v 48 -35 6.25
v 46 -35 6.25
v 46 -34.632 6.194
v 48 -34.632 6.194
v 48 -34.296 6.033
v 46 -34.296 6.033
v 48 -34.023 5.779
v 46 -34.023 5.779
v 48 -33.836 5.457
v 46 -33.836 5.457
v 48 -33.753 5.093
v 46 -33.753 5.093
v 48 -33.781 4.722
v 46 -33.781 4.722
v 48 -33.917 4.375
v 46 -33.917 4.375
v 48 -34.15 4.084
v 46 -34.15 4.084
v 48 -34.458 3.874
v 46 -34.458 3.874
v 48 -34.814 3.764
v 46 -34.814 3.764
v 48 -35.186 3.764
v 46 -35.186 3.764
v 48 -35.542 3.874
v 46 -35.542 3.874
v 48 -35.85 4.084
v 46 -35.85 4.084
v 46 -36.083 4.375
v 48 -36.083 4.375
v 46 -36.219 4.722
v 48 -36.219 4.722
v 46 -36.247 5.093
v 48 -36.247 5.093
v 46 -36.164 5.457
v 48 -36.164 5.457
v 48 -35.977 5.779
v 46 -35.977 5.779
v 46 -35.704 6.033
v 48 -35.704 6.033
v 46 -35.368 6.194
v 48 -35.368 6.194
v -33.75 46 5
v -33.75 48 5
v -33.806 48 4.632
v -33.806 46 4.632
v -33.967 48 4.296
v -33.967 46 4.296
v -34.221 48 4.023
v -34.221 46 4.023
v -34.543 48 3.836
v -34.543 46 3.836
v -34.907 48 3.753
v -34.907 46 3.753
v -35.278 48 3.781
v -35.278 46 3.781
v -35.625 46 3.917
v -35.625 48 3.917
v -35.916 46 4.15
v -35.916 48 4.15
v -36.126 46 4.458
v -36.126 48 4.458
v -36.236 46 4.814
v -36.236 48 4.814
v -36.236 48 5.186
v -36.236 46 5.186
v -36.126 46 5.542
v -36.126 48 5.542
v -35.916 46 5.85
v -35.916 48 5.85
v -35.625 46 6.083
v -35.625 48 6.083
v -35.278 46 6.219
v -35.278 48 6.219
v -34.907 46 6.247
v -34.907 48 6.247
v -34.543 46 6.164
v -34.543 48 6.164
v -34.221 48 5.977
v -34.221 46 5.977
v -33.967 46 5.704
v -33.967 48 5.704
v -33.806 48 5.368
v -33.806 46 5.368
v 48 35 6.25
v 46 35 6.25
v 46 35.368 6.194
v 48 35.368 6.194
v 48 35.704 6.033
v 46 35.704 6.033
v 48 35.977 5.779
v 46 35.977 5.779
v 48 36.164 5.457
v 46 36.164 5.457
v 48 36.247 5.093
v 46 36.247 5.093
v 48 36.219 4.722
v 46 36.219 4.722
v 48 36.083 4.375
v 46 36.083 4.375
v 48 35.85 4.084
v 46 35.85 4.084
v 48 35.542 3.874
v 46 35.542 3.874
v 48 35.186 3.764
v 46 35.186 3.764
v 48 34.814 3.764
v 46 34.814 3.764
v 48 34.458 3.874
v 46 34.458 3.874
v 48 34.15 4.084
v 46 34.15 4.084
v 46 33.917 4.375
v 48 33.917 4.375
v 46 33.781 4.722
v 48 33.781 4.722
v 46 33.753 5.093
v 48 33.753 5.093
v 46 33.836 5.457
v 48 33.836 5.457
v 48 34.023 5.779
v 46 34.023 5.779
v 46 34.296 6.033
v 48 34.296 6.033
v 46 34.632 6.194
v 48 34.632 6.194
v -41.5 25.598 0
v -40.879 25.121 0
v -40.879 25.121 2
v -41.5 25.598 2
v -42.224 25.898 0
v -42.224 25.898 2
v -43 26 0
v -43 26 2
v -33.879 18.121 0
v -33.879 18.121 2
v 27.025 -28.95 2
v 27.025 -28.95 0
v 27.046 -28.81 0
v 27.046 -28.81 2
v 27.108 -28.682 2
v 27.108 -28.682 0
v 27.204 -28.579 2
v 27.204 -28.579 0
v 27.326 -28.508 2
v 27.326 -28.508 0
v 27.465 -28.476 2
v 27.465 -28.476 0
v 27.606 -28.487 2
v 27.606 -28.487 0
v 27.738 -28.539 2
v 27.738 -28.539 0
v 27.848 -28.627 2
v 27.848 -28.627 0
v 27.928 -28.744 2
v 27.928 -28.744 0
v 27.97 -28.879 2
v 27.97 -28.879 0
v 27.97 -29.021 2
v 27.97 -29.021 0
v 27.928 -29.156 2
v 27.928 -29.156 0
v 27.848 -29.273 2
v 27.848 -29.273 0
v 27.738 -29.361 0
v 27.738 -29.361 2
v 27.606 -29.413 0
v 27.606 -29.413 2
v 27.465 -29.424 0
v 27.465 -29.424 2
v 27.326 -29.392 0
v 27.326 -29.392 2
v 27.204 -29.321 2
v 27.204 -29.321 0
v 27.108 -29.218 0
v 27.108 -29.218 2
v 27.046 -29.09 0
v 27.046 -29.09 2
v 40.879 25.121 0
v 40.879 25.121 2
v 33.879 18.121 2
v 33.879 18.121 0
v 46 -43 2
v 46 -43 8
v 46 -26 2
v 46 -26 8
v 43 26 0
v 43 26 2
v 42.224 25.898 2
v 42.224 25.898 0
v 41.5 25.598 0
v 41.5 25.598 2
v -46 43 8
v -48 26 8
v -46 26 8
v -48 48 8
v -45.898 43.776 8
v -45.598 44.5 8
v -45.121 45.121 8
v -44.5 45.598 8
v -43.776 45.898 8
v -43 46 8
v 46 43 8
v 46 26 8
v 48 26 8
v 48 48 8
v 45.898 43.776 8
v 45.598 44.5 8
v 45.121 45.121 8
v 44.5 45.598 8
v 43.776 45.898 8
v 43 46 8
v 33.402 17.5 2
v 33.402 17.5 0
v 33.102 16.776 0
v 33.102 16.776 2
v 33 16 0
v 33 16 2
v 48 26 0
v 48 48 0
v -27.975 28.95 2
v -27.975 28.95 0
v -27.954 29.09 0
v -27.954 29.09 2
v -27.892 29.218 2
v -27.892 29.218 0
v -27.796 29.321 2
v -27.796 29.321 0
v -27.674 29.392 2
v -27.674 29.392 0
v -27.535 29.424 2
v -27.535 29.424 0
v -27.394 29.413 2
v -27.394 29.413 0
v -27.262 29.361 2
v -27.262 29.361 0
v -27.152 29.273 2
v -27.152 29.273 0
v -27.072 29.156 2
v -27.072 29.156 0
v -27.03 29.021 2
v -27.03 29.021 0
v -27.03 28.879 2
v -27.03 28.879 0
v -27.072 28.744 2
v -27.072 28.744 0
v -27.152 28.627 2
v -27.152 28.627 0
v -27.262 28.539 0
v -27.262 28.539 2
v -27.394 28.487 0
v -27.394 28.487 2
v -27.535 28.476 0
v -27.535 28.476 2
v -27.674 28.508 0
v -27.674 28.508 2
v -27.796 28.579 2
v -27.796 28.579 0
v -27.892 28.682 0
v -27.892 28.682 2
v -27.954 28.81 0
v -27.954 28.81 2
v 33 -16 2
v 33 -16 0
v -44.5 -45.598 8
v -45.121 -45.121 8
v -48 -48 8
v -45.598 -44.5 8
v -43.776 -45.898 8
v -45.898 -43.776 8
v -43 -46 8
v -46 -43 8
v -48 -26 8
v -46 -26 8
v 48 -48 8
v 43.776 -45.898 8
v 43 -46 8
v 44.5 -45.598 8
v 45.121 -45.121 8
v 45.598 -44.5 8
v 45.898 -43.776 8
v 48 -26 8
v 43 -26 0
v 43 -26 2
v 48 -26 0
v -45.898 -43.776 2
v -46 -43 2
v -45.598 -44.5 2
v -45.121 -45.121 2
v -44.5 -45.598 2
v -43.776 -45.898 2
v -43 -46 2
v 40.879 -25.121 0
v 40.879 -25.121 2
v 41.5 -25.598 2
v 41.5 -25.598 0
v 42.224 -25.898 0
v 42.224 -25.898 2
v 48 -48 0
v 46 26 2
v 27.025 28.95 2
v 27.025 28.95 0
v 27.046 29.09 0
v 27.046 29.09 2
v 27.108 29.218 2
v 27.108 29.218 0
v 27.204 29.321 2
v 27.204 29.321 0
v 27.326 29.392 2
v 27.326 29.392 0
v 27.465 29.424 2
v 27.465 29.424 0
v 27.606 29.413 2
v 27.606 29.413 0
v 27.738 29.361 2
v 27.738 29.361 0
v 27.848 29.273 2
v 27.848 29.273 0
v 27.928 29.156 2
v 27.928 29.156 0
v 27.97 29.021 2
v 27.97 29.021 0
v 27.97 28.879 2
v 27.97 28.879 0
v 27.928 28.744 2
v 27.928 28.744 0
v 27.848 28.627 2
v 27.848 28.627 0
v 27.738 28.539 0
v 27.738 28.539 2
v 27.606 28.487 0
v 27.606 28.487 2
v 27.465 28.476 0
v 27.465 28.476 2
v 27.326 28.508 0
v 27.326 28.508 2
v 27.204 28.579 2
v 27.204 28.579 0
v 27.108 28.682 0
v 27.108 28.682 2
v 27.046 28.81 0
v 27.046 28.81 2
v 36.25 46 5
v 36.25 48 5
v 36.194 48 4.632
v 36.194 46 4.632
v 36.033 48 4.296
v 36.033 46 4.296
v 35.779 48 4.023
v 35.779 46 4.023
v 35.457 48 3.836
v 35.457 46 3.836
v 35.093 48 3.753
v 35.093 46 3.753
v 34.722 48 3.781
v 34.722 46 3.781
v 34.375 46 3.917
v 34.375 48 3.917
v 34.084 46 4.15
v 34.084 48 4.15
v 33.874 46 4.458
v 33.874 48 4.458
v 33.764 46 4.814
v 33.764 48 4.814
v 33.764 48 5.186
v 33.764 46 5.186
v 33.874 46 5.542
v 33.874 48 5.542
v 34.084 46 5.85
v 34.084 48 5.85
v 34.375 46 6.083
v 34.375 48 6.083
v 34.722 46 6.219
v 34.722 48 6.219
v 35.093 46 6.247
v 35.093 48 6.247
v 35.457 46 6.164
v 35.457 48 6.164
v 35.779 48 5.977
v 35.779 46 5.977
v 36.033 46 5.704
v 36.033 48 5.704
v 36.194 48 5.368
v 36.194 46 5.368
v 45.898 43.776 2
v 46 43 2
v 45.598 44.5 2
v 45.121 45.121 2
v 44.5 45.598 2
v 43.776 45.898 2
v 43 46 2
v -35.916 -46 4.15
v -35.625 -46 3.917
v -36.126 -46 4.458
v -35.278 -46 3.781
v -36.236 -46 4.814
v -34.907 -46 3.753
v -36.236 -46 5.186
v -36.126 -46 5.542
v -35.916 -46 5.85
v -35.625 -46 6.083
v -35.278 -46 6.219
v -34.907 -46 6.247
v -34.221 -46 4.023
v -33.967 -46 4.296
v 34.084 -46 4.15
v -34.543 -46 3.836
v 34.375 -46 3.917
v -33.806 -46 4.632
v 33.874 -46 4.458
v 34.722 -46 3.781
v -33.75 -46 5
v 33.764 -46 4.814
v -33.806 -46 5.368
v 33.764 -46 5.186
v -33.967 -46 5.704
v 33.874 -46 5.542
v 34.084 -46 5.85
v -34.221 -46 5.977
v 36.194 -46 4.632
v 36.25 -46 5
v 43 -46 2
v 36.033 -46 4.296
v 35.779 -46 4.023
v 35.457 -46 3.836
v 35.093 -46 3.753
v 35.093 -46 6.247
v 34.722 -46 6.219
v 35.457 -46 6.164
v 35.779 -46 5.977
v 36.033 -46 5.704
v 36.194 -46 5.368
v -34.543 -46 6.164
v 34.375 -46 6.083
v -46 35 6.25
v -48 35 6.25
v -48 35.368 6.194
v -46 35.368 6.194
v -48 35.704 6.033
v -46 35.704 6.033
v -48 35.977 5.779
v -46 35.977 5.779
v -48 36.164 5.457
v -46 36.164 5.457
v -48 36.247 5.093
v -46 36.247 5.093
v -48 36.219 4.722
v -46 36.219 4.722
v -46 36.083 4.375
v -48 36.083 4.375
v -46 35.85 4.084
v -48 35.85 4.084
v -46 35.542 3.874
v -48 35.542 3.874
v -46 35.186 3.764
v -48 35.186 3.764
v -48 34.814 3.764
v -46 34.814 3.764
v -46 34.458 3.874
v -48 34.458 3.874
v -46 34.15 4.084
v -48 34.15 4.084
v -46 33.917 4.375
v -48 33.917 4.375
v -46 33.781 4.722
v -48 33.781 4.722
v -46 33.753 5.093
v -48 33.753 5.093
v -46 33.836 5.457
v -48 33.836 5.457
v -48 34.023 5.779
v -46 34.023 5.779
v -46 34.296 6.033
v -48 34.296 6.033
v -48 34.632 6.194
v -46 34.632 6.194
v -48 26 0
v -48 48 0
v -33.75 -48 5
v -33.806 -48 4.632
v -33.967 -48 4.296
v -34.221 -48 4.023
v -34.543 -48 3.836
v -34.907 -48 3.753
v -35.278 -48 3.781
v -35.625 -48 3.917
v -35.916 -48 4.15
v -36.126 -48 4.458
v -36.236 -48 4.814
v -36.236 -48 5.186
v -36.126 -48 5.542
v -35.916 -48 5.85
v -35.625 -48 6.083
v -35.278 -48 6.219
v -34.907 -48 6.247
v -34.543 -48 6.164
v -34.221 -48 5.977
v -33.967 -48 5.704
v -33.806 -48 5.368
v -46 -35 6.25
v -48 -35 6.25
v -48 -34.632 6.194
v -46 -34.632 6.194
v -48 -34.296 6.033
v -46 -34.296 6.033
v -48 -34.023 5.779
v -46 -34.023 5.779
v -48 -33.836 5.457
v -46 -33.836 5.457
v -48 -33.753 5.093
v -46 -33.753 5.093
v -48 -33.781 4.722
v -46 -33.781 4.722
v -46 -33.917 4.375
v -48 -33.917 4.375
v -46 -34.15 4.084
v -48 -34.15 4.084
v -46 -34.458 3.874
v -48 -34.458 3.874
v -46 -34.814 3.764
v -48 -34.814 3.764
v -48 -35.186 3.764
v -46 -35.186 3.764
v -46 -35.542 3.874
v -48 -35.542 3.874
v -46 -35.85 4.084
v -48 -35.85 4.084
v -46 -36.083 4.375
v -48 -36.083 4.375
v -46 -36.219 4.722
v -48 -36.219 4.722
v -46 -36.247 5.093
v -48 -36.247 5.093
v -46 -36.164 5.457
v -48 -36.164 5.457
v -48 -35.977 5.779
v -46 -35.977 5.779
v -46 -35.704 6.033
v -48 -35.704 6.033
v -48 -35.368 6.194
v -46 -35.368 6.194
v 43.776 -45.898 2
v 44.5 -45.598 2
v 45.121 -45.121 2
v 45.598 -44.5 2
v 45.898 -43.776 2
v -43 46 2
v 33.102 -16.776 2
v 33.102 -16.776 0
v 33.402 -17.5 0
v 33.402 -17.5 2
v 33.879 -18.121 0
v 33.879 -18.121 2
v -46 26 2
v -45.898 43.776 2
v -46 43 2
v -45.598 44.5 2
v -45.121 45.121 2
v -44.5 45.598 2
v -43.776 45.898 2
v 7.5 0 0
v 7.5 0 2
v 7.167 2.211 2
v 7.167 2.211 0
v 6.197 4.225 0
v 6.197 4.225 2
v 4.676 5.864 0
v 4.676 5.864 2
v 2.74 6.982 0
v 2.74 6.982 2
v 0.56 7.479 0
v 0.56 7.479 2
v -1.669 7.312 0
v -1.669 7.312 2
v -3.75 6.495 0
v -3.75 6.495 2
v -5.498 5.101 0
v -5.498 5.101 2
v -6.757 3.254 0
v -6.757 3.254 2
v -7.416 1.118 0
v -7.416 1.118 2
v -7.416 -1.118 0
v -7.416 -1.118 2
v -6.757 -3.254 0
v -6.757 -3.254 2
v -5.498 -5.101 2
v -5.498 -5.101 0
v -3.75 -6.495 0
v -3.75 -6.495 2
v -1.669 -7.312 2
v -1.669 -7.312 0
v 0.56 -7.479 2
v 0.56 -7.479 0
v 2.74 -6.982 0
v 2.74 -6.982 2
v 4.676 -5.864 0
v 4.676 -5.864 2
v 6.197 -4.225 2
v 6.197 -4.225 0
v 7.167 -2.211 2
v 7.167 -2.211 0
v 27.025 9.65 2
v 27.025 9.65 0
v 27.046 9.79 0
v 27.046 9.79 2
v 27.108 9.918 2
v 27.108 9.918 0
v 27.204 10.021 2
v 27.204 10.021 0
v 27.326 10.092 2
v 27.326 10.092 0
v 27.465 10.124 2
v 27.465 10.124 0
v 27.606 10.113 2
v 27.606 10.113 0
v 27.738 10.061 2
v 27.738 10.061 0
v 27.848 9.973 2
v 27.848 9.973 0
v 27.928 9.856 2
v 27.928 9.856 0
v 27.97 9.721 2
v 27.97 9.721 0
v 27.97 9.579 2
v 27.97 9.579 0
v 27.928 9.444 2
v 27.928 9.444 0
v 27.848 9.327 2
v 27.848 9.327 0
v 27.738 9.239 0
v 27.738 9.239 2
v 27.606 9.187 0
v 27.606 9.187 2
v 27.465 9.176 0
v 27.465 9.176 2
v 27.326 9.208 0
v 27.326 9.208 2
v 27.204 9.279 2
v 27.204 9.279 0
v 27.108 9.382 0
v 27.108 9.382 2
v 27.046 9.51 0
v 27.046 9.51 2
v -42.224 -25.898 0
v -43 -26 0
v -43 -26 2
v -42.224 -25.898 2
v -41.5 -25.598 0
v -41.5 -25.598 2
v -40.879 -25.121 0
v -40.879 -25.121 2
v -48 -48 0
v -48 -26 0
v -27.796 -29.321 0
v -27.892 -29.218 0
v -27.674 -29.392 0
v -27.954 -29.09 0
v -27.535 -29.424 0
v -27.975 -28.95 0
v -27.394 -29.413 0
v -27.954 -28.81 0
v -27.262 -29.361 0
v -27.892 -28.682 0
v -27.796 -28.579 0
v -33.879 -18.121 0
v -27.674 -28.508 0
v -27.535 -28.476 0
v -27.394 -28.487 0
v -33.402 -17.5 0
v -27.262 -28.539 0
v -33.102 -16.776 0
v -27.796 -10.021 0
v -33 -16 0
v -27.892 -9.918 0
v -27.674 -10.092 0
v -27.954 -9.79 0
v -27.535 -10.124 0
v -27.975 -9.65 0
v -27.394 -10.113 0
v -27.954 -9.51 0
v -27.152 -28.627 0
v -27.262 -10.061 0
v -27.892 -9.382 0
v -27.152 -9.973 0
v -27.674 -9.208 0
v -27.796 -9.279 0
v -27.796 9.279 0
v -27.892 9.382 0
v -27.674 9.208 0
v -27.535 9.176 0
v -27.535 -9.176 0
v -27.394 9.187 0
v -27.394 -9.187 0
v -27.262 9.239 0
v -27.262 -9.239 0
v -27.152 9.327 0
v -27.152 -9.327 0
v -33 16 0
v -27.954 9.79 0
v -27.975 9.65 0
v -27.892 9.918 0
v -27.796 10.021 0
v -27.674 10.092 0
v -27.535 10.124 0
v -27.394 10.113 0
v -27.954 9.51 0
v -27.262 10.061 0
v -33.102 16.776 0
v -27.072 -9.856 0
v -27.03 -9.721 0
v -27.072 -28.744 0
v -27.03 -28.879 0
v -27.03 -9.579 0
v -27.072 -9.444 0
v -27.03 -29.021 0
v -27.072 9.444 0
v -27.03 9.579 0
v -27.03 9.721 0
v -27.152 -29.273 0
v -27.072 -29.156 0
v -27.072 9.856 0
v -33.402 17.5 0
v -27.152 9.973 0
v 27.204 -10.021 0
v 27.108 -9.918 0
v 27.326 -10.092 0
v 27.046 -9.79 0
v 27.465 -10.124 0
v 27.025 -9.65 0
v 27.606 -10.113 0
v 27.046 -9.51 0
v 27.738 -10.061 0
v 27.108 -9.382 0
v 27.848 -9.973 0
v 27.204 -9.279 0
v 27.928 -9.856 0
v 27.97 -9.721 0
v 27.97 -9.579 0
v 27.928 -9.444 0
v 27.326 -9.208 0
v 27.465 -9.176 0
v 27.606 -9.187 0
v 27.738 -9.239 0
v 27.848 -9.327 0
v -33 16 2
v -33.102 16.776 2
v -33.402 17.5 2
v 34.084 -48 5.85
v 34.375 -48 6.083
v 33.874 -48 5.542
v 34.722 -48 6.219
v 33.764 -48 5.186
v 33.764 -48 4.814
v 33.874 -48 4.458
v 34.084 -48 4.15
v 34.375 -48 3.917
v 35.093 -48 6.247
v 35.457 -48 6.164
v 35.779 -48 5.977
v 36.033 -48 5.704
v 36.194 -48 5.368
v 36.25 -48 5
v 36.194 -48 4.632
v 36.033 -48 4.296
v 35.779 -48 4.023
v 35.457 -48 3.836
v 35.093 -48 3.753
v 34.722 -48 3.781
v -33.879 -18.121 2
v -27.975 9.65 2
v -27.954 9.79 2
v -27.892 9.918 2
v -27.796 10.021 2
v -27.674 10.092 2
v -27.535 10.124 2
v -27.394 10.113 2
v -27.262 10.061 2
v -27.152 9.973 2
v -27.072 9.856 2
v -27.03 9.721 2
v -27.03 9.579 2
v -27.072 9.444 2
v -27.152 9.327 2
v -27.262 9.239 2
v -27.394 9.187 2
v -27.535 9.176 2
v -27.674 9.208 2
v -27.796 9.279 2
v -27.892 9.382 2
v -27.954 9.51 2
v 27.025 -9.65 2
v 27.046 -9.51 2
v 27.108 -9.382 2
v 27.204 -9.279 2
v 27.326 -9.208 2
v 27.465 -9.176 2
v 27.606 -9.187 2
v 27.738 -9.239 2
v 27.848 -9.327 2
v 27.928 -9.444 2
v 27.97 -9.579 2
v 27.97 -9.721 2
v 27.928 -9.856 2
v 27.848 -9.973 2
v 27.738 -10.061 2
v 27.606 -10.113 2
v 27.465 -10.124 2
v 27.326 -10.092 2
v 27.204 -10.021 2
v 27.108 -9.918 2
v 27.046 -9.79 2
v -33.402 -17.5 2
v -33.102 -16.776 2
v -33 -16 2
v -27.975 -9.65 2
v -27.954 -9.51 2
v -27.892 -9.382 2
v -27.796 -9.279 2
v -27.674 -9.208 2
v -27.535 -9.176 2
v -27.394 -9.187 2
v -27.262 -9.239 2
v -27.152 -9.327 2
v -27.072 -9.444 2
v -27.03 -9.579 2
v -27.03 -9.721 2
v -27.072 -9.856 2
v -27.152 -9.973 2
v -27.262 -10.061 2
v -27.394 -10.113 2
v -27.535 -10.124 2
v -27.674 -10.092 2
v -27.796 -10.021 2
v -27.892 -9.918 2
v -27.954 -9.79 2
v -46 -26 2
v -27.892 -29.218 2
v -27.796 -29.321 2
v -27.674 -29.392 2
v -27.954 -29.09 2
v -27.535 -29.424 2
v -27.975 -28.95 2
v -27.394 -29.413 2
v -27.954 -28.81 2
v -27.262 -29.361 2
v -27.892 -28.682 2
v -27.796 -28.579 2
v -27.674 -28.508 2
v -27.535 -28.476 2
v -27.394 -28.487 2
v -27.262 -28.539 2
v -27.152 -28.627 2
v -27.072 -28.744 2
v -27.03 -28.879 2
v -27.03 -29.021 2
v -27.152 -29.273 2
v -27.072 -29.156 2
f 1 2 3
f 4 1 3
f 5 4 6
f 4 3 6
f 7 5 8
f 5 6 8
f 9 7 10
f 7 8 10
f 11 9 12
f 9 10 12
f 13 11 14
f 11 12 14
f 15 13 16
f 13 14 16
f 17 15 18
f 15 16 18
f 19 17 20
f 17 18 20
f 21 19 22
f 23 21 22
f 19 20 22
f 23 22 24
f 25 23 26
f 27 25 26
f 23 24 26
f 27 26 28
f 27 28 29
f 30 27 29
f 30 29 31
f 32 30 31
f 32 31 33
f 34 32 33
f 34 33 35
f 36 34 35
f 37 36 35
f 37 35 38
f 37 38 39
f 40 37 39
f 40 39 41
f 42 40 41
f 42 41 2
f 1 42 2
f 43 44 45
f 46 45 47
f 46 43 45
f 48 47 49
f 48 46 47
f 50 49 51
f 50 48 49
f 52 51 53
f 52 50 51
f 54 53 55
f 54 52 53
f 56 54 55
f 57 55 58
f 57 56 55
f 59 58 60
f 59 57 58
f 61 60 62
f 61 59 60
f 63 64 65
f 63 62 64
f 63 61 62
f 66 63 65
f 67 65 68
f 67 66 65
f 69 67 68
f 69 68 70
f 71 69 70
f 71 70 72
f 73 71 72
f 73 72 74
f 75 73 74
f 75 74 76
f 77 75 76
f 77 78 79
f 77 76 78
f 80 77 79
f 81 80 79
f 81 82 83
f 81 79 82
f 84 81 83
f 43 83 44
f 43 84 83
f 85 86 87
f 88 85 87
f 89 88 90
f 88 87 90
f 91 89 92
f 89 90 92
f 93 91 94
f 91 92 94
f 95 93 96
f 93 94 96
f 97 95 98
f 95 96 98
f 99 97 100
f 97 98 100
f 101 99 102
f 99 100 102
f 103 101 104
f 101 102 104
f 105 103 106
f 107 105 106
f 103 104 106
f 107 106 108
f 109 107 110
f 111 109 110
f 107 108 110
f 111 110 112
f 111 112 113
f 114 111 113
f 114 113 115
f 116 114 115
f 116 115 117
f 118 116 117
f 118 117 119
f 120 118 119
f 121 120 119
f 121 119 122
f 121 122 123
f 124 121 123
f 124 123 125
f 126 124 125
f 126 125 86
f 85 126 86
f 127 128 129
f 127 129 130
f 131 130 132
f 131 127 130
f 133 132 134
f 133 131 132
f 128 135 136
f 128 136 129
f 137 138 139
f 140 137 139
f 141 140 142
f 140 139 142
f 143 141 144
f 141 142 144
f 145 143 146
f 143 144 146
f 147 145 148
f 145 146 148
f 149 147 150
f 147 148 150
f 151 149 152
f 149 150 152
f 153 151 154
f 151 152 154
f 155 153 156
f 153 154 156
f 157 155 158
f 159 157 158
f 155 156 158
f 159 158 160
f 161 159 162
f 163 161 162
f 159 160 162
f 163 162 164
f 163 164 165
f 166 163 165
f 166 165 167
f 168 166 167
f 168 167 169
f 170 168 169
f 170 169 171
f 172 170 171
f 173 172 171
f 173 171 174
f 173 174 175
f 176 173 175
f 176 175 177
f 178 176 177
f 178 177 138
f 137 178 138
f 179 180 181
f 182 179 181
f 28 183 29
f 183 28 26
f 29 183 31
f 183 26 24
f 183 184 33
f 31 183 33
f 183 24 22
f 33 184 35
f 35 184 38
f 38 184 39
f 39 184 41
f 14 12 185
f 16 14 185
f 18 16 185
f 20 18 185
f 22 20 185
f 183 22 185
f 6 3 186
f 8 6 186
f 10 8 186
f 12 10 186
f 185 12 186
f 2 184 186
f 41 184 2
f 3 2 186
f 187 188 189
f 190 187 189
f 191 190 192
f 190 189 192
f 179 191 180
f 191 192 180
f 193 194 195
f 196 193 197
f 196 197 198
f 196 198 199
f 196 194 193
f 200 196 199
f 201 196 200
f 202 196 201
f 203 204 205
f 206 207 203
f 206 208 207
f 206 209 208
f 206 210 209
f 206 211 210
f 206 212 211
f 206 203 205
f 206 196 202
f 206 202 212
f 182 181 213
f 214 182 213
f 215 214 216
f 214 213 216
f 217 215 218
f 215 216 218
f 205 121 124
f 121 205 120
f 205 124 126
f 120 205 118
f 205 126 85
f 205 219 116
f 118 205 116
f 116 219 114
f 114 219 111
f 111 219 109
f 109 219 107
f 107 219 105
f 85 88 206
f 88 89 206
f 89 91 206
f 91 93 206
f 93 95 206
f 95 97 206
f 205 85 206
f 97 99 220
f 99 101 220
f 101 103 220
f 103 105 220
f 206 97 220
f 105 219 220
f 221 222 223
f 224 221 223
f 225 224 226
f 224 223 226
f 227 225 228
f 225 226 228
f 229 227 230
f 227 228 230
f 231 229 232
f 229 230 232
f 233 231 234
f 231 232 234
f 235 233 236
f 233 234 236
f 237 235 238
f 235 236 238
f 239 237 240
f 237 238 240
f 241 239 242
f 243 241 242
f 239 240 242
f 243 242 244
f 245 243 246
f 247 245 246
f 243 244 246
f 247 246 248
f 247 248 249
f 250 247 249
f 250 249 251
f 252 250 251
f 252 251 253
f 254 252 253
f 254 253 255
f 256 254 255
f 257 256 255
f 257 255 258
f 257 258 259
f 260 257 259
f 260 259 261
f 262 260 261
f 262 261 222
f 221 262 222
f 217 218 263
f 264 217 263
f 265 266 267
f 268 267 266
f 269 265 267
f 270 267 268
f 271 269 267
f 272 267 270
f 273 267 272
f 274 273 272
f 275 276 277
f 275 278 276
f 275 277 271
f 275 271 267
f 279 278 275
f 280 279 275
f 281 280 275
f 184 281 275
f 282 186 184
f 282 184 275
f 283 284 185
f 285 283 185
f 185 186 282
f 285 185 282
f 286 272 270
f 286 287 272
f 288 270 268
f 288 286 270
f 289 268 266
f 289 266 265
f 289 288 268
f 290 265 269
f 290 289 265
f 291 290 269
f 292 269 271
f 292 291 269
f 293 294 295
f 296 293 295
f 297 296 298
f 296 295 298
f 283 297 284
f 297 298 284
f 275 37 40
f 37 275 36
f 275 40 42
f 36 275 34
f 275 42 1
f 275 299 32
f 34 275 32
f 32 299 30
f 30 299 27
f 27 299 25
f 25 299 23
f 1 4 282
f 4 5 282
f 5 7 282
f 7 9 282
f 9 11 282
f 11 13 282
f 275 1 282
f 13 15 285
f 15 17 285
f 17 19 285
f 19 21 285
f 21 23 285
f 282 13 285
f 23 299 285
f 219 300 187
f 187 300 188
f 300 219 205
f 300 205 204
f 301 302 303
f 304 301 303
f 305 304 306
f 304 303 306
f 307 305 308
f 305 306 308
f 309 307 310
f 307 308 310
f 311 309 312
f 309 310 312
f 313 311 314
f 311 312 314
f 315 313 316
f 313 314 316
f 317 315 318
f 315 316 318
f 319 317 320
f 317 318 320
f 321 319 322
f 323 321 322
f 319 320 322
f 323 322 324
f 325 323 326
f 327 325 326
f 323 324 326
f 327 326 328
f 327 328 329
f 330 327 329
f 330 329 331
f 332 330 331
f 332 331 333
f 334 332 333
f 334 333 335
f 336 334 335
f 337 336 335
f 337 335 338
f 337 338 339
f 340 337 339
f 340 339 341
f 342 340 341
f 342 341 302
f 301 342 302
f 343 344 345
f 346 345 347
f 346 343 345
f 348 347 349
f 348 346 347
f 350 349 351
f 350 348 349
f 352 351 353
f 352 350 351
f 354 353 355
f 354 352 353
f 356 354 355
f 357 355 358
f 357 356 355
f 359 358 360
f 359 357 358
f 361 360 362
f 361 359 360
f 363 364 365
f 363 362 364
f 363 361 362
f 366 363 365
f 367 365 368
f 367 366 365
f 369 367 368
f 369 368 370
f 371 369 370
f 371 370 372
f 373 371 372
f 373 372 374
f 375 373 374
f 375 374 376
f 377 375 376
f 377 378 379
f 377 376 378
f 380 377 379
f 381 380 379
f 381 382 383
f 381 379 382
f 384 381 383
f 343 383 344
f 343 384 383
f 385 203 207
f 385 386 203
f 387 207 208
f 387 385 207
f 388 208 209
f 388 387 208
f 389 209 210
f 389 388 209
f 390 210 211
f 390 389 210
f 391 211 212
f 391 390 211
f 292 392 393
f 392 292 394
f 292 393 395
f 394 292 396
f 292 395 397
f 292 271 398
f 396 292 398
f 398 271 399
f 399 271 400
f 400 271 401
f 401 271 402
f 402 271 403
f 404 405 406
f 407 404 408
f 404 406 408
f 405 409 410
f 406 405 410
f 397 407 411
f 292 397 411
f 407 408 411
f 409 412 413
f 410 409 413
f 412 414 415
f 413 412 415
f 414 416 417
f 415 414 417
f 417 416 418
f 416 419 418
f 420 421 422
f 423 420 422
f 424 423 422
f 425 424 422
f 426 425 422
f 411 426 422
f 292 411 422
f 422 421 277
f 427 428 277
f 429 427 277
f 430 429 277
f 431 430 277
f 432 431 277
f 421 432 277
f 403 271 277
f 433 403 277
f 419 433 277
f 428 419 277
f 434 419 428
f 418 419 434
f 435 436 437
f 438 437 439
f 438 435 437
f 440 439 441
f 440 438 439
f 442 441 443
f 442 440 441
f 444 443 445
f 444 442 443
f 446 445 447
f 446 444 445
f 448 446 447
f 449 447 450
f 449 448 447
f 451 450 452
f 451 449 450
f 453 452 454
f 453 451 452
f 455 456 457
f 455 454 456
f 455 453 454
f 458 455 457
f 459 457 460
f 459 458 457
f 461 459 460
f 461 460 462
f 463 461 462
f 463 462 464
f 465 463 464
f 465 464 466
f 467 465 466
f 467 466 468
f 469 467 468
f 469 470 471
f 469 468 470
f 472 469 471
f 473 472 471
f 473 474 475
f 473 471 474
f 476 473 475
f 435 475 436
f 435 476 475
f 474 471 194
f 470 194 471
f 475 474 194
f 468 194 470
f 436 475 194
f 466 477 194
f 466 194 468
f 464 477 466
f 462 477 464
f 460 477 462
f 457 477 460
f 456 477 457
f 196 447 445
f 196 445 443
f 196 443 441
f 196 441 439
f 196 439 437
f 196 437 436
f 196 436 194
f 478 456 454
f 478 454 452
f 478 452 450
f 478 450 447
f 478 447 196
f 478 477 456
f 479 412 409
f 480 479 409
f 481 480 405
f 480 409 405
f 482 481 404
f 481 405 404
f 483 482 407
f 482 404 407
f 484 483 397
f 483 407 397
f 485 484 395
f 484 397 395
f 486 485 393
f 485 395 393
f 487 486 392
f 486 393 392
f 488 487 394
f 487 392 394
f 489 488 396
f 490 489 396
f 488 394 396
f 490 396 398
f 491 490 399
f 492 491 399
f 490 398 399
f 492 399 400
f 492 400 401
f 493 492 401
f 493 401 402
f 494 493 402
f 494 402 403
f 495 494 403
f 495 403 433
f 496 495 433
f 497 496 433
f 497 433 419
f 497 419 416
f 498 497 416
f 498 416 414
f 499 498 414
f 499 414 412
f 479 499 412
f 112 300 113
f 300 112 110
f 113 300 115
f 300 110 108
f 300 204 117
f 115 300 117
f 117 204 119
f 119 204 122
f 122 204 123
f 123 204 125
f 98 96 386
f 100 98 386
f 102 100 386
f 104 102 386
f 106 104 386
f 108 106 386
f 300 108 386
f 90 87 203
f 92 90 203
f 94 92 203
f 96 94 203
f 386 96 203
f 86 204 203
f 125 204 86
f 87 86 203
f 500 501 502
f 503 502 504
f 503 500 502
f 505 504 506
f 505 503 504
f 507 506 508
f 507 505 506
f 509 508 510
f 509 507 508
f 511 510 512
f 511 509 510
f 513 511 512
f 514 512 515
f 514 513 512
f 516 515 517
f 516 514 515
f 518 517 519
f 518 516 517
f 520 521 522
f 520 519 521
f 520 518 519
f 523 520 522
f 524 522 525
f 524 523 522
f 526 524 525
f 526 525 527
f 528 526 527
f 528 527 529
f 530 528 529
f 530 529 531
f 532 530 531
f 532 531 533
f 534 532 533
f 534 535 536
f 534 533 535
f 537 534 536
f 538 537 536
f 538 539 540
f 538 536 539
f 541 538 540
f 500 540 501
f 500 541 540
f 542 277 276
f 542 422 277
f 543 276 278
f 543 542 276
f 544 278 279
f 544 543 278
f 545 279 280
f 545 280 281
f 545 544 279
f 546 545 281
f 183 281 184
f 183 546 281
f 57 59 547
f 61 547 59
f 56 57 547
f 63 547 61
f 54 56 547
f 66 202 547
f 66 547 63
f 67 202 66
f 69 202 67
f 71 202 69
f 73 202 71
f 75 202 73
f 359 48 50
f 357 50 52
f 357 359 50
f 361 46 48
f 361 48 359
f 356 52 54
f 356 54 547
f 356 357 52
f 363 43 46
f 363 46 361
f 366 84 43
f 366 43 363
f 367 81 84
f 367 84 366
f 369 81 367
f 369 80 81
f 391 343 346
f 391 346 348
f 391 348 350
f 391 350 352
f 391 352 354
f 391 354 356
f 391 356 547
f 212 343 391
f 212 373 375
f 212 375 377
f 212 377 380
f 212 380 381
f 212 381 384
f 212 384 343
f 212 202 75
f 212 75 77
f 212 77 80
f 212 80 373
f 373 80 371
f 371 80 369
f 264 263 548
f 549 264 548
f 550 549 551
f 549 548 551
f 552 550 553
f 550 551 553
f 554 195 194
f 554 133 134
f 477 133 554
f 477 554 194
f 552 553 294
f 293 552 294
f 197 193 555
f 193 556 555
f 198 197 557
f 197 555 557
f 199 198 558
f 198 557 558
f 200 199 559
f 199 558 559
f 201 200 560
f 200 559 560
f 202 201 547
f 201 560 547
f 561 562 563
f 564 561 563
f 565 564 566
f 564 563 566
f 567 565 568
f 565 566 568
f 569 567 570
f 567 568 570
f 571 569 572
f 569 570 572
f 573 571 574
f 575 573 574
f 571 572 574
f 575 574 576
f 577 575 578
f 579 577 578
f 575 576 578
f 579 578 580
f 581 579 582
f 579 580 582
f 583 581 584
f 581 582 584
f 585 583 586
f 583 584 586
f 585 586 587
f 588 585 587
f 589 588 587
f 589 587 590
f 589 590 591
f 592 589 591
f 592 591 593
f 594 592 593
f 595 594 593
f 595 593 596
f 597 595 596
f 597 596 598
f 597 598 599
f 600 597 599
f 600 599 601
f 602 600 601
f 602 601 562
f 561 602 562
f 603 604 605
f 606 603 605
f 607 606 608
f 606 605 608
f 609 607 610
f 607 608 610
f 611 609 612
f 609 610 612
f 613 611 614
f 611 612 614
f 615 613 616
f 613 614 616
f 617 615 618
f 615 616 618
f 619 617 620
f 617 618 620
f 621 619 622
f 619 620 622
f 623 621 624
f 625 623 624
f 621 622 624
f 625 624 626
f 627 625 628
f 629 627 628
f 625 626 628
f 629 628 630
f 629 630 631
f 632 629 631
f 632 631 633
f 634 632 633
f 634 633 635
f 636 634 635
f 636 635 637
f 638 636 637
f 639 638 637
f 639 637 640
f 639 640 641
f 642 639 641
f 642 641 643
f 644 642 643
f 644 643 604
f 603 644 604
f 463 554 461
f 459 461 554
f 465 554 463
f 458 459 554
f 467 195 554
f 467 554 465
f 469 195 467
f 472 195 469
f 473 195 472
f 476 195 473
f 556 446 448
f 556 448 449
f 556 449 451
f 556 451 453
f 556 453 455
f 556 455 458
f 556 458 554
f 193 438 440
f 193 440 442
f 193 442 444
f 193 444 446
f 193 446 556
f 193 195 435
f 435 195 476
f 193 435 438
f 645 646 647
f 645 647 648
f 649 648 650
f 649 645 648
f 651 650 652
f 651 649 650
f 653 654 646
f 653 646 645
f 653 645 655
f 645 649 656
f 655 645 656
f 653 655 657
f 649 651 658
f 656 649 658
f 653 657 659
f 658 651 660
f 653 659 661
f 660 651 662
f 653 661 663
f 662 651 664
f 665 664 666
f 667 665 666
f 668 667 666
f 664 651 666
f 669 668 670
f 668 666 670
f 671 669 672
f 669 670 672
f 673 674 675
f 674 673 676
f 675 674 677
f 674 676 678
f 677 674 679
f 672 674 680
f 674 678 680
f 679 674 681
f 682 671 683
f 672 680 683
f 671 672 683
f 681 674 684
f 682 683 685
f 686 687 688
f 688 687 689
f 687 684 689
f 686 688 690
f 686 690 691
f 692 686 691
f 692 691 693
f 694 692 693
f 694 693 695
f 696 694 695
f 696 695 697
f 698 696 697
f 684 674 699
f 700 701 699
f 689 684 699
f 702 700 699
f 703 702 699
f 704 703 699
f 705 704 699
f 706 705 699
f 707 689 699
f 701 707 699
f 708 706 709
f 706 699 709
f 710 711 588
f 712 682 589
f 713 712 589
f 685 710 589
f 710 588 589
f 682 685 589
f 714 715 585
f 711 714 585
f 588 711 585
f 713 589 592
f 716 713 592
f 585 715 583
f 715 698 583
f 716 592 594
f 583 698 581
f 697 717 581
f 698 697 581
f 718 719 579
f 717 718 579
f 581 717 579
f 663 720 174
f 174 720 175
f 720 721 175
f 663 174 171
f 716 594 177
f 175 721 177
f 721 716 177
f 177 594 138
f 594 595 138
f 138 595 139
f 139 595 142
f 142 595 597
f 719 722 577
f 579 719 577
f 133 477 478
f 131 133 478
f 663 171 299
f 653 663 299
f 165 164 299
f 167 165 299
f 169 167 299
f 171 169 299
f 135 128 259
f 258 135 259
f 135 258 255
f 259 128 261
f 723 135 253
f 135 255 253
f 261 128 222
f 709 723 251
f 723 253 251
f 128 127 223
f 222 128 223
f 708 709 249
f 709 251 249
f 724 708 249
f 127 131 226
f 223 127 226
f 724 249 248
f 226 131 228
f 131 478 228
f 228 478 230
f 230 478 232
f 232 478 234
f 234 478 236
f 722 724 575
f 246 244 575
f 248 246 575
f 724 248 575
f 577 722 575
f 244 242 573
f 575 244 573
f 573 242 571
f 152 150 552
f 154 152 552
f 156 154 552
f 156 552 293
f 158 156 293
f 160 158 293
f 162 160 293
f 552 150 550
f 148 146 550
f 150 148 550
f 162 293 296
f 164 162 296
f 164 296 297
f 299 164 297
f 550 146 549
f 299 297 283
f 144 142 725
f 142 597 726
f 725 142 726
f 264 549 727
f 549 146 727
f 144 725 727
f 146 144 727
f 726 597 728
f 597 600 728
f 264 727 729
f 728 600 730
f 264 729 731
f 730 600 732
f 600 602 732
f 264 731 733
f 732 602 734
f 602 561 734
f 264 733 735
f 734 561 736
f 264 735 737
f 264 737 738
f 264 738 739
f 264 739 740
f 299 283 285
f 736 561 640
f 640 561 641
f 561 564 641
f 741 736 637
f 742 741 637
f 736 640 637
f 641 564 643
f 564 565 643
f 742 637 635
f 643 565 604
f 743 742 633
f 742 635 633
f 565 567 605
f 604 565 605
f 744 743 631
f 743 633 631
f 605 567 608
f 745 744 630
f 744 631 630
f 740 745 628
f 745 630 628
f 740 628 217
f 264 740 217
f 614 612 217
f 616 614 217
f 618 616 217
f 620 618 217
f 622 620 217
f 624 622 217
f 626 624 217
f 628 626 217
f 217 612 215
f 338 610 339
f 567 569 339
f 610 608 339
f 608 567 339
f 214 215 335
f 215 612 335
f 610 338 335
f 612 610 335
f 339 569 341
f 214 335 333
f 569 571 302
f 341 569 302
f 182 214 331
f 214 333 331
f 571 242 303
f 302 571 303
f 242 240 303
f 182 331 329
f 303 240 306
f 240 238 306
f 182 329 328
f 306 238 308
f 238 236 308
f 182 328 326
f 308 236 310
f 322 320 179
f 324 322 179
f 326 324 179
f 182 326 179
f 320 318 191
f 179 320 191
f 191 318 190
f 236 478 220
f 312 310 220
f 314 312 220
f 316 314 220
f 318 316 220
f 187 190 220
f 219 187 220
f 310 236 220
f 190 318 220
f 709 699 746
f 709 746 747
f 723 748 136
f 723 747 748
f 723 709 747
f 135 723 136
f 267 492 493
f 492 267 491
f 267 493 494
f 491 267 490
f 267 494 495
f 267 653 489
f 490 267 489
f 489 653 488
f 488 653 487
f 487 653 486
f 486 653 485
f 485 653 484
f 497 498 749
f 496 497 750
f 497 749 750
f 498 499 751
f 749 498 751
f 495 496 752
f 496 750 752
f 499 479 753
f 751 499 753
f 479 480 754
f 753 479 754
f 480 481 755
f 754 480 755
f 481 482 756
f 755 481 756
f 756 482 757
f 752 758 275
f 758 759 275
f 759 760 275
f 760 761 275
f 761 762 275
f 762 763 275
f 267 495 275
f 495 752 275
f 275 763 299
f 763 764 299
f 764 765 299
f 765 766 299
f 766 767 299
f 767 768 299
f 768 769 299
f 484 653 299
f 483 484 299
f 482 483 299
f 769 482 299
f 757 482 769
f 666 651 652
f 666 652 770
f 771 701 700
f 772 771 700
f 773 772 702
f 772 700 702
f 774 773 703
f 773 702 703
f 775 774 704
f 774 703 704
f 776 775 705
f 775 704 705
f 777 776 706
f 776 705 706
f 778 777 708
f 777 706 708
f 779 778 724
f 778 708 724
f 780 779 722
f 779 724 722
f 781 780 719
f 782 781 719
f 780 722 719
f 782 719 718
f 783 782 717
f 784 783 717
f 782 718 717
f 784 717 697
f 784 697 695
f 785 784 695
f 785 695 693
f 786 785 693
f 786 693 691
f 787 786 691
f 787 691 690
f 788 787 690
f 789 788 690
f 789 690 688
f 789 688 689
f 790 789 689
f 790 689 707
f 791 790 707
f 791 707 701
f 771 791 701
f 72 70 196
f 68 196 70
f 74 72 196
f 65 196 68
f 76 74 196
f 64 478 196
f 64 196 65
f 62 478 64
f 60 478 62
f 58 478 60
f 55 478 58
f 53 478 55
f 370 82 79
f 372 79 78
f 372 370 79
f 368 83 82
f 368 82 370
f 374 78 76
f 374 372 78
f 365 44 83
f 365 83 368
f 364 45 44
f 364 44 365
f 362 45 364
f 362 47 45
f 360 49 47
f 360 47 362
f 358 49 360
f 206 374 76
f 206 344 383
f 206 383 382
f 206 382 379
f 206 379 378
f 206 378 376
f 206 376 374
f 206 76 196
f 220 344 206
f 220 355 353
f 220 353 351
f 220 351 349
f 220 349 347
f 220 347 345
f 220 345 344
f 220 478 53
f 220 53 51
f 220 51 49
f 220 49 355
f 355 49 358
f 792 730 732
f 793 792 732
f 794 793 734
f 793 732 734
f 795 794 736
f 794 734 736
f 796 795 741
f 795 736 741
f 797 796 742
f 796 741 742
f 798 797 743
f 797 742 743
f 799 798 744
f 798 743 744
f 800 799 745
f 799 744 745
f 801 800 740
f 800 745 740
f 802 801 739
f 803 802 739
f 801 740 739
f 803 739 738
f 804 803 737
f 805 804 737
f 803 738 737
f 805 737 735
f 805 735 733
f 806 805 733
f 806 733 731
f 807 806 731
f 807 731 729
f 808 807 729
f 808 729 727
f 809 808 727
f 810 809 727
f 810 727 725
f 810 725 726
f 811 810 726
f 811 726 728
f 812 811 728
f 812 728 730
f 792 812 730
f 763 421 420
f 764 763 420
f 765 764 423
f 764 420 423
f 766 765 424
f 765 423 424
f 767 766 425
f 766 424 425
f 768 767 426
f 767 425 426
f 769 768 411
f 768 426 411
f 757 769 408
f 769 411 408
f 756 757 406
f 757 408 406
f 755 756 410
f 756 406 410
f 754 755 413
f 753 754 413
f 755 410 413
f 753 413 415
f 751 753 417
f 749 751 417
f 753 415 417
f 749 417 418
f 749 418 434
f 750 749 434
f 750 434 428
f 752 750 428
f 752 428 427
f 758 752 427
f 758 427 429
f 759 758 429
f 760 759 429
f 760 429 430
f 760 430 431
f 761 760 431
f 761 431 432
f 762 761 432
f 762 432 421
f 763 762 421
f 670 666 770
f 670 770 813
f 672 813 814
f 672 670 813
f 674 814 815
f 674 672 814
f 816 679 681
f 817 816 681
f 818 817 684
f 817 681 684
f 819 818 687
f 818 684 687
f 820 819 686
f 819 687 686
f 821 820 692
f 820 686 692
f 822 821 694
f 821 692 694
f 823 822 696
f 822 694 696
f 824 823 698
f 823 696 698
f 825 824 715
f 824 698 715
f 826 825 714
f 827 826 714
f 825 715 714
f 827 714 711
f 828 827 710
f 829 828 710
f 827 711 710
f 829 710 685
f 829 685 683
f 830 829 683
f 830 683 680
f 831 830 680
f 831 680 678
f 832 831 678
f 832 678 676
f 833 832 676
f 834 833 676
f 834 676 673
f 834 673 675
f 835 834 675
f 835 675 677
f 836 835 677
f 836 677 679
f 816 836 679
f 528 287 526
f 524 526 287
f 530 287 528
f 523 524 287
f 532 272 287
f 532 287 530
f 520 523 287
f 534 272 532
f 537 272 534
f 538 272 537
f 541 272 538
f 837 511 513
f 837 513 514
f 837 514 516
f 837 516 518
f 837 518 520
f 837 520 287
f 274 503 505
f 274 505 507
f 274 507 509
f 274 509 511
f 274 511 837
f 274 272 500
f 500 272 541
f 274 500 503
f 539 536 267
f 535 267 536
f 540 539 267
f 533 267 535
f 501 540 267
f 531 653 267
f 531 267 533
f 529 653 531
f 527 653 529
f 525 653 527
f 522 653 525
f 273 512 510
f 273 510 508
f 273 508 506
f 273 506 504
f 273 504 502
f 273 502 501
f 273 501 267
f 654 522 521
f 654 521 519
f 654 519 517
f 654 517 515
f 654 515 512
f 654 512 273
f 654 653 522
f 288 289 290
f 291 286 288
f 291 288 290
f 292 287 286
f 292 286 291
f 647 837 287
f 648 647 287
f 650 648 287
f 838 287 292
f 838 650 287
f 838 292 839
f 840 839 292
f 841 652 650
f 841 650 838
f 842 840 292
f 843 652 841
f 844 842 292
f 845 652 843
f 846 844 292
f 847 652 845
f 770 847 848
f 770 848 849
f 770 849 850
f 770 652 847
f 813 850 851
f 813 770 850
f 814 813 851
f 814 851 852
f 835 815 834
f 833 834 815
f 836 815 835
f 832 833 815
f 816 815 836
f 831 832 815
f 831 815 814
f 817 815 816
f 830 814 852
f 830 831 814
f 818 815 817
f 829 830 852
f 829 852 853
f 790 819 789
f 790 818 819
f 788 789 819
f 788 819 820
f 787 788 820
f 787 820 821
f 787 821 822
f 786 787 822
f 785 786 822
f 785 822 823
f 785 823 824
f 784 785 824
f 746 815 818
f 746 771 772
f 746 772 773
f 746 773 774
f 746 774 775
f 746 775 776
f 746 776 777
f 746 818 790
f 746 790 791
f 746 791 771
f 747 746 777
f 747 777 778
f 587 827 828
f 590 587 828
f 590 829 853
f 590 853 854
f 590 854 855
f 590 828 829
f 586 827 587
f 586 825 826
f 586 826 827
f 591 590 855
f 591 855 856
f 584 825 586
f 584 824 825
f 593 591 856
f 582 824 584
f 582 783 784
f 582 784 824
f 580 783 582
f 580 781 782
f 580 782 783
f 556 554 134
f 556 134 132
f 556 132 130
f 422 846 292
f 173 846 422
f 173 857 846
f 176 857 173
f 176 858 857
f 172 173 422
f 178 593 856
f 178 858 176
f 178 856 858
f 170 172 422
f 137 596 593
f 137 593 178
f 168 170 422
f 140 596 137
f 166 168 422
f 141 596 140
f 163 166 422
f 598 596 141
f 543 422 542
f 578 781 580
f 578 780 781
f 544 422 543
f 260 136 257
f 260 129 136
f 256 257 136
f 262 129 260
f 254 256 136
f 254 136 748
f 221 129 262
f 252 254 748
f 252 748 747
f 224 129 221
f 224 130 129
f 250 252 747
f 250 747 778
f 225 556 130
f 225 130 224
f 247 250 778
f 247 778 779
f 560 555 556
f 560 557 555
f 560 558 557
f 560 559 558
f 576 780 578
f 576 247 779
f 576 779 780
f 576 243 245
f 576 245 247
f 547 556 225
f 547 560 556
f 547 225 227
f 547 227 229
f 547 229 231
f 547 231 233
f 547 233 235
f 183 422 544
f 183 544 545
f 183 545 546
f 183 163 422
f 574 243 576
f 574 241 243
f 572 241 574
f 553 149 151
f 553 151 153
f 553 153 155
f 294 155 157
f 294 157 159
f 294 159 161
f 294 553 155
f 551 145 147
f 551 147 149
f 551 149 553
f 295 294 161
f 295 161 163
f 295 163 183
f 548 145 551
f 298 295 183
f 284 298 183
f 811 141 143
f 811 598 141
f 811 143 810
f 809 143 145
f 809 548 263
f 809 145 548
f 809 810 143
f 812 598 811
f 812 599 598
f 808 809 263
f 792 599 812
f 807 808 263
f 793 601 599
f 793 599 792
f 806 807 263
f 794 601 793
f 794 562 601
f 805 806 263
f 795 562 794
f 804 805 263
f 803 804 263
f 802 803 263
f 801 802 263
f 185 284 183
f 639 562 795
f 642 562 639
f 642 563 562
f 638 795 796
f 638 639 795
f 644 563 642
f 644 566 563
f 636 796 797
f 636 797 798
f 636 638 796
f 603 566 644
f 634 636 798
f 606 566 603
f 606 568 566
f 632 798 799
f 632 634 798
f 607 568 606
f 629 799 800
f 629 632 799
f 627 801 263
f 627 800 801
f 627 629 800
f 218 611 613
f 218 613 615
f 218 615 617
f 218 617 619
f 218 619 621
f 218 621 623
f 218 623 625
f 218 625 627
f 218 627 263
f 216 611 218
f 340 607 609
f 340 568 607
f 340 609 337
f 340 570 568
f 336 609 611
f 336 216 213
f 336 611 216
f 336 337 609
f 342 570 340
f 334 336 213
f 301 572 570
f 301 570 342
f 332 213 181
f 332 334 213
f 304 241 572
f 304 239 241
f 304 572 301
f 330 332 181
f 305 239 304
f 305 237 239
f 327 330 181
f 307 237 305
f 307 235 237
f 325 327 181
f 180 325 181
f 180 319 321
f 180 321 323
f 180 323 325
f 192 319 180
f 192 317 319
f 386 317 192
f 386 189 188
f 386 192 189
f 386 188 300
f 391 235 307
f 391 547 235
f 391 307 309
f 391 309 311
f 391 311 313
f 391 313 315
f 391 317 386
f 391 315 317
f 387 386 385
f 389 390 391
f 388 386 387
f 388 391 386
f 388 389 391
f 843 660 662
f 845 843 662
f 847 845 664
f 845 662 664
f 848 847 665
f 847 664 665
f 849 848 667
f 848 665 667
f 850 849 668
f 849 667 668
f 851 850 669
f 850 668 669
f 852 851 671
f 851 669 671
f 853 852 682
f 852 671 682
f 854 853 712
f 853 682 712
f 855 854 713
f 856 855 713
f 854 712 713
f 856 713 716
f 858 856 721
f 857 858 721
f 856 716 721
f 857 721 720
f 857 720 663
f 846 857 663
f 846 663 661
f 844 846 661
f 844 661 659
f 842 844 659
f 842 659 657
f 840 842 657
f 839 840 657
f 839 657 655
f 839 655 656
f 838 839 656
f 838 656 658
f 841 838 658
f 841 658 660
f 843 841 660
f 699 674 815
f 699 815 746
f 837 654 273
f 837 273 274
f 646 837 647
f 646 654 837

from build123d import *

# Parameters (mm, degrees)
SKETCH1_W                       = 96
SKETCH1_H                       = 96
BOSS_EXTRUDE1_DEPTH             = 8
SKETCH2_W                       = 92
SKETCH2_H                       = 92
COMPONENT_PLATFORM_DEPTH        = 6
CABLE_SLOTS_DEPTH               = 6
SKETCH4_R                       = 7.5
CENTER_MASS_CUT_DEPTH           = 6
INNER_CORNER_FILLETS_R          = 3
TAP_DRILL_FOR_M3X0_5_TAP4_D     = 2.5
TAP_DRILL_FOR_M3X0_5_TAP4_DEPTH = 2
TAP_DRILL_FOR_M1_2X0_25_TAP1_D  = 0.95
TAP_DRILL_FOR_M3X0_5_TAP3_D     = 2.5
TAP_DRILL_FOR_M3X0_5_TAP3_DEPTH = 2


with BuildPart() as part:
    # Sketch1 → Boss-Extrude1 (new body)
    with BuildSketch(Plane.XY):
        Rectangle(SKETCH1_W, SKETCH1_H)
    extrude(amount=BOSS_EXTRUDE1_DEPTH)

    # Sketch2 → Component Platform (cut)
    with BuildSketch(Plane.XY.offset(8)):
        Rectangle(SKETCH2_W, SKETCH2_H)
    extrude(amount=-COMPONENT_PLATFORM_DEPTH, mode=Mode.SUBTRACT)

    # Sketch3 → Cable Slots (cut, symmetric)
    with BuildSketch(Plane.XY.offset(2)):
        with BuildLine():
            Line((-40.878679656, -25.121320344), (-33.878679656, -18.121320344))
            ThreePointArc((-33.878679656, -18.121320344), (-33.228361402, -17.148050297), (-33, -16))
            Line((-33, -16), (-33, 16))
            ThreePointArc((-33, 16), (-33.228361402, 17.148050297), (-33.878679656, 18.121320344))
            Line((-33.878679656, 18.121320344), (-40.878679656, 25.121320344))
            ThreePointArc((-40.878679656, 25.121320344), (-41.851949703, 25.771638598), (-43, 26))
            Line((-43, 26), (-48, 26))
            Line((-48, 26), (-48, -26))
            Line((-48, -26), (-43, -26))
            ThreePointArc((-43, -26), (-41.851949703, -25.771638598), (-40.878679656, -25.121320344))
        make_face()
        with BuildLine():
            Line((48, -26), (48, 26))
            Line((48, 26), (43, 26))
            ThreePointArc((43, 26), (41.851949703, 25.771638598), (40.878679656, 25.121320344))
            Line((40.878679656, 25.121320344), (33.878679656, 18.121320344))
            ThreePointArc((33.878679656, 18.121320344), (33.228361402, 17.148050297), (33, 16))
            Line((33, 16), (33, -16))
            ThreePointArc((33, -16), (33.228361402, -17.148050297), (33.878679656, -18.121320344))
            Line((33.878679656, -18.121320344), (40.878679656, -25.121320344))
            ThreePointArc((40.878679656, -25.121320344), (41.851949703, -25.771638598), (43, -26))
            Line((43, -26), (48, -26))
        make_face()
    extrude(amount=CABLE_SLOTS_DEPTH, both=True, mode=Mode.SUBTRACT)

    # Sketch4 → Center Mass Cut (cut)
    with BuildSketch(Plane.XY.offset(2)):
        Circle(SKETCH4_R)
    extrude(amount=-CENTER_MASS_CUT_DEPTH, mode=Mode.SUBTRACT)

    # Inner Corner Fillets
    inner_corner_fillets_edges = [part.edges().sort_by_distance(p)[0] for p in [
        (-46, -46, 5),
        (-46, 46, 5),
        (46, 46, 5),
        (46, -46, 5),
    ]]
    fillet(inner_corner_fillets_edges, radius=INNER_CORNER_FILLETS_R)

    # Tap Drill for M3x0.5 Tap4
    with Locations(Plane(origin=(0, -48, 0), x_dir=(-1, 0, 0), z_dir=(0, -1, 0))):
        with Locations((35, -5), (-35, -5)):
            tap_drill_for_m3x0_5_tap4 = Hole(TAP_DRILL_FOR_M3X0_5_TAP4_D / 2, depth=TAP_DRILL_FOR_M3X0_5_TAP4_DEPTH)

    # Mirror2: Tap Drill for M3x0.5 Tap4 across plane
    add(tap_drill_for_m3x0_5_tap4.mirror(Plane(origin=(0, 0, 0), x_dir=(0, 0, 1), z_dir=(0, -1, 0))), mode=Mode.SUBTRACT)

    # Tap Drill for M1.2x0.25 Tap1 (through all)
    with Locations(Plane.XY.offset(2)):
        with Locations((-27.5, 28.95), (-27.5, 9.65), (-27.5, -9.65), (-27.5, -28.95), (27.5, -28.95), (27.5, -9.65), (27.5, 9.65), (27.5, 28.95)):
            Hole(TAP_DRILL_FOR_M1_2X0_25_TAP1_D / 2)

    # Tap Drill for M3x0.5 Tap3
    with Locations(Plane(origin=(48, 0, 0), x_dir=(0, 0, -1), z_dir=(1, 0, 0))):
        with Locations((-5, -35), (-5, 35)):
            tap_drill_for_m3x0_5_tap3 = Hole(TAP_DRILL_FOR_M3X0_5_TAP3_D / 2, depth=TAP_DRILL_FOR_M3X0_5_TAP3_DEPTH)

    # Mirror3: Tap Drill for M3x0.5 Tap3 across plane
    add(tap_drill_for_m3x0_5_tap3.mirror(Plane(origin=(0, 0, 0), x_dir=(0, 0, 1), z_dir=(1, 0, 0))), mode=Mode.SUBTRACT)


solid = part.part
